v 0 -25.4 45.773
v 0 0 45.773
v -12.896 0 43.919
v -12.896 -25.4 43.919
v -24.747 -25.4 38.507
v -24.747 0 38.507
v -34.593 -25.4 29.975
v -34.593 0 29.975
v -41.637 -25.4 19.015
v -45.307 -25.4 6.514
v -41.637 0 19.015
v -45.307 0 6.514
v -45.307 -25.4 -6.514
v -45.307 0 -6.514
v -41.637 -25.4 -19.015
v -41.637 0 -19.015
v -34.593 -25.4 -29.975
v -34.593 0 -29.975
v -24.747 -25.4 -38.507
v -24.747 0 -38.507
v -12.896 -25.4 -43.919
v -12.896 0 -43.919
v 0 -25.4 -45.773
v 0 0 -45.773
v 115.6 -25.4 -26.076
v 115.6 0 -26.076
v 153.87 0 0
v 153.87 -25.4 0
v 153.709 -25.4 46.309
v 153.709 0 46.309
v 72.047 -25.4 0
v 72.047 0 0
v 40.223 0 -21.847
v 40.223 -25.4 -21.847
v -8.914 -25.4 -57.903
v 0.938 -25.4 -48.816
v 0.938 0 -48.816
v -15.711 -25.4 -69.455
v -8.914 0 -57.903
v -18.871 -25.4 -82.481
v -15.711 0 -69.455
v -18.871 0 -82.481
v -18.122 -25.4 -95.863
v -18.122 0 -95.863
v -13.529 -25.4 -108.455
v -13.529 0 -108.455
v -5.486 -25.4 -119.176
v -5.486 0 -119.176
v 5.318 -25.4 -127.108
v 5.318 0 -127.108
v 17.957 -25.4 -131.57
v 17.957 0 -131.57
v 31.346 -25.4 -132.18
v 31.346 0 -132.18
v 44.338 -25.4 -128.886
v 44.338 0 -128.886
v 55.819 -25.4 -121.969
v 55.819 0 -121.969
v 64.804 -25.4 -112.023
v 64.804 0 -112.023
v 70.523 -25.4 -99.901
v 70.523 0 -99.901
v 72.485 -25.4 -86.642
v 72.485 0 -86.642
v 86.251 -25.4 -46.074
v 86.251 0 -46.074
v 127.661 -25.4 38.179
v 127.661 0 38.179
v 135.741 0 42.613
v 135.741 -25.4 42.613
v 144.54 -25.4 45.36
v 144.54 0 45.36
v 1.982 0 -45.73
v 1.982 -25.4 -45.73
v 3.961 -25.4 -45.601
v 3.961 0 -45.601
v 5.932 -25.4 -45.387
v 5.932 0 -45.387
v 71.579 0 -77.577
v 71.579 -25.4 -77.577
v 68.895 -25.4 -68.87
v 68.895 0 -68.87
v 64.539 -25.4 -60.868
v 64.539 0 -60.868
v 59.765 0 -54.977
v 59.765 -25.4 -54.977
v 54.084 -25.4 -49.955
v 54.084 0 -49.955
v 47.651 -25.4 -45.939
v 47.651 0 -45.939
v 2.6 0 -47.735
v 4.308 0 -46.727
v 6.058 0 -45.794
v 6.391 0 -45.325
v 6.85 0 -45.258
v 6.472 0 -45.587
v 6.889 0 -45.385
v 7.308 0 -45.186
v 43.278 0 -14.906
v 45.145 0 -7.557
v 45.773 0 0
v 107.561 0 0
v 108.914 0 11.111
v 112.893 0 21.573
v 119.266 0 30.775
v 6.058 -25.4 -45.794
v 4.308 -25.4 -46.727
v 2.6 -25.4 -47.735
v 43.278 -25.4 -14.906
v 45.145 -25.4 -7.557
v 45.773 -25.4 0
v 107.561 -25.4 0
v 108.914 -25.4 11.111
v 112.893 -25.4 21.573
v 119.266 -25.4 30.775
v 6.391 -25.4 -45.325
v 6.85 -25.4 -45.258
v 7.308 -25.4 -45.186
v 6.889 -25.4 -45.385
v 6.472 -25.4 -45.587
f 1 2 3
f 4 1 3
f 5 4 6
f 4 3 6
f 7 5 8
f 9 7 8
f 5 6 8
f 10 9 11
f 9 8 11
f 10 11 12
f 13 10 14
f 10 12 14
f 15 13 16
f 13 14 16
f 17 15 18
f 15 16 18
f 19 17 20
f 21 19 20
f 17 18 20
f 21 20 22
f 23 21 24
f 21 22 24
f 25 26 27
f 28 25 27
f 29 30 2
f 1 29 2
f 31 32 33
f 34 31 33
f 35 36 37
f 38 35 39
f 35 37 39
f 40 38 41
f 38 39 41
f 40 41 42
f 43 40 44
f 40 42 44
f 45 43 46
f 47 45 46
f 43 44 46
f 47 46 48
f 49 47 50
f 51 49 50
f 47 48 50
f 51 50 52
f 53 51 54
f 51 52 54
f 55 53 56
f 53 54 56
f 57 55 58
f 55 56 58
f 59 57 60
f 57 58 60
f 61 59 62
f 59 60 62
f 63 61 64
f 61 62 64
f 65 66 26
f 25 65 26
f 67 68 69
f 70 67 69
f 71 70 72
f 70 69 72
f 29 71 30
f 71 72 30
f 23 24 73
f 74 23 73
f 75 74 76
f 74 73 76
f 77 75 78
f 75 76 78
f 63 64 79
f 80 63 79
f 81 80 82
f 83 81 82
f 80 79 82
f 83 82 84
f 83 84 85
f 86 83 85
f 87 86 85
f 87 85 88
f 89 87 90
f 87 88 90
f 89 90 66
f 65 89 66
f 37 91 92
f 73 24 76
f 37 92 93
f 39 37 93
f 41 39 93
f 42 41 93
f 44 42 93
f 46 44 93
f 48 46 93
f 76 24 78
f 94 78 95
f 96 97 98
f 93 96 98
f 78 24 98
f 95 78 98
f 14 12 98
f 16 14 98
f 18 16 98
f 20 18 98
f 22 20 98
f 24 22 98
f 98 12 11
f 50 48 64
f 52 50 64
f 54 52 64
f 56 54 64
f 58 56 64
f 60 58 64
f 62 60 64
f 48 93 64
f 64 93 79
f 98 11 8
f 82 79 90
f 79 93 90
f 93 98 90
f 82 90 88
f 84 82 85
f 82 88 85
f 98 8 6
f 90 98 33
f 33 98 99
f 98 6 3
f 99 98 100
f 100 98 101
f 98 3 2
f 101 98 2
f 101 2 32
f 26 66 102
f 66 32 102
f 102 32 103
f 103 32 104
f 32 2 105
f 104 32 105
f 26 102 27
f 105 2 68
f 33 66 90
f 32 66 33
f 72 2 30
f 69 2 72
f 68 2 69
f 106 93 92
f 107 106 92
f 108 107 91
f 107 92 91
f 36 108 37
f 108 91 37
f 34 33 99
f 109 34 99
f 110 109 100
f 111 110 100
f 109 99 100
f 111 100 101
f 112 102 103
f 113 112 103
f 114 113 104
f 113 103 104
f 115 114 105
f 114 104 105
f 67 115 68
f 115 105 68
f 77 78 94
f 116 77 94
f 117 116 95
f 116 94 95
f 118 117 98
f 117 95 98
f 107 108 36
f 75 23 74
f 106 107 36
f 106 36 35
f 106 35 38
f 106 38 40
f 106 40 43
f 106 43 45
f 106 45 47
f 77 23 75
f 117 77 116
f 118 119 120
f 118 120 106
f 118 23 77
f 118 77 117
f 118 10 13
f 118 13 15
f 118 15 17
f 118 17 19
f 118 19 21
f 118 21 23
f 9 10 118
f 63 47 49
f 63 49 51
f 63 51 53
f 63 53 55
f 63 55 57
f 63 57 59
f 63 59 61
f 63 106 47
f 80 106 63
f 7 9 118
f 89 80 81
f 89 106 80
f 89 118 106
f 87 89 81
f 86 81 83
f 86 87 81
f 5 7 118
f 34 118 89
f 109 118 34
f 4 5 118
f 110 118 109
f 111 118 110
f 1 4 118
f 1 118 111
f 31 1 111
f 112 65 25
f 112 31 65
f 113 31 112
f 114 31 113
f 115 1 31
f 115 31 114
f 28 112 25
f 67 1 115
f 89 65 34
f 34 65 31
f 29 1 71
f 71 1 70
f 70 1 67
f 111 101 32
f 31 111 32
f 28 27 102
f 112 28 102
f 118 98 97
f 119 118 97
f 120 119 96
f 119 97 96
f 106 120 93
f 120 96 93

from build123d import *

# Parameters (mm, degrees)
F1_DEPTH = 25.4


with BuildPart() as f1:
    # F0 (on Front) → F1 (new body)
    with BuildSketch(Plane.XZ):
        with BuildLine():
            Line((72.0466873491, 0), (40.2231729678, -21.8466586519))
            ThreePointArc((40.2231729678, -21.8466586519), (31.3848696272, -33.3192151219), (19.4048266012, -41.4563968819))
            ThreePointArc((19.4048266012, -41.4563968819), (33.8870469148, -41.4351204215), (47.6510526714, -45.9392633402))
            Line((47.6510526714, -45.9392633402), (86.2514989391, -46.0738358679))
            Line((86.2514989391, -46.0738358679), (115.6003371528, -26.0762075411))
            ThreePointArc((115.6003371528, -26.0762075411), (109.6163777827, -13.6436900901), (107.560902013, 0))
            Line((107.560902013, 0), (72.0466873491, 0))
        make_face()
        with BuildLine():
            Line((127.6607268874, 38.1787166397), (72.0466873491, 0))
            Line((72.0466873491, 0), (107.560902013, 0))
            ThreePointArc((107.560902013, 0), (112.8928076077, 21.5732320494), (127.6607268874, 38.1787166397))
        make_face()
        with BuildLine():
            ThreePointArc((47.6510526714, -45.9392633402), (33.8870469148, -41.4351204215), (19.4048266012, -41.4563968819))
            ThreePointArc((19.4048266012, -41.4563968819), (13.4857274503, -43.7414596577), (7.3075106005, -45.1860645185))
            ThreePointArc((7.3075106005, -45.1860645185), (6.6804139573, -45.4854183946), (6.0579339451, -45.7942574747))
            Line((6.0579339451, -45.7942574747), (47.6510526714, -45.9392633402))
        make_face()
        with BuildLine():
            ThreePointArc((64.5391180148, -60.8681565374), (57.0284030969, -52.3479095519), (47.6510526714, -45.9392633402))
            Line((47.6510526714, -45.9392633402), (6.0579339451, -45.7942574747))
            ThreePointArc((6.0579339451, -45.7942574747), (3.4488790791, -47.2217605692), (0.9380323387, -48.8156805874))
            ThreePointArc((0.9380323387, -48.8156805874), (-11.1144436113, -112.4167662635), (52.4866420648, -124.4692422135))
            ThreePointArc((52.4866420648, -124.4692422135), (67.1780692741, -108.036494814), (72.4854749339, -86.6424614004))
            ThreePointArc((72.4854749339, -86.6424614004), (70.4537968594, -73.1567339501), (64.5391180148, -60.8681565374))
        make_face()
        with BuildLine():
            Line((153.8701951504, 0), (107.560902013, 0))
            ThreePointArc((107.560902013, 0), (109.6163777827, -13.6436900901), (115.6003371528, -26.0762075411))
            Line((115.6003371528, -26.0762075411), (153.8701951504, 0))
        make_face()
        with BuildLine():
            ThreePointArc((40.2231729678, -21.8466586519), (44.3639548177, -11.2702994984), (45.7731377322, 0))
            ThreePointArc((45.7731377322, 0), (32.3664960866, 32.3664960866), (0, 45.7731377322))
            ThreePointArc((0, 45.7731377322), (-45.7731377322, 0), (0, -45.7731377322))
            ThreePointArc((0, -45.7731377322), (2.9724733003, -45.676520668), (5.932398121, -45.3870773501))
            Line((5.932398121, -45.3870773501), (40.2231729678, -21.8466586519))
        make_face()
        with BuildLine():
            ThreePointArc((0, 45.7731377322), (32.3664960866, 32.3664960866), (45.7731377322, 0))
            Line((45.7731377322, 0), (72.0466873491, 0))
            Line((72.0466873491, 0), (127.6607268874, 38.1787166397))
            ThreePointArc((127.6607268874, 38.1787166397), (140.0723070667, 44.2059828), (153.7087482925, 46.3090117126))
            Line((153.7087482925, 46.3090117126), (0, 45.7731377322))
        make_face()
        with BuildLine():
            ThreePointArc((19.4048266012, -41.4563968819), (31.3848696272, -33.3192151219), (40.2231729678, -21.8466586519))
            Line((40.2231729678, -21.8466586519), (5.932398121, -45.3870773501))
            ThreePointArc((5.932398121, -45.3870773501), (6.6207172783, -45.2917899908), (7.3075106005, -45.1860645185))
            ThreePointArc((7.3075106005, -45.1860645185), (13.2266097514, -42.9010017427), (19.4048266012, -41.4563968819))
        make_face()
        with BuildLine():
            ThreePointArc((7.3075106005, -45.1860645185), (13.4857274503, -43.7414596577), (19.4048266012, -41.4563968819))
            ThreePointArc((19.4048266012, -41.4563968819), (13.2266097514, -42.9010017427), (7.3075106005, -45.1860645185))
        make_face()
    extrude(amount=F1_DEPTH)


solid = f1.part
